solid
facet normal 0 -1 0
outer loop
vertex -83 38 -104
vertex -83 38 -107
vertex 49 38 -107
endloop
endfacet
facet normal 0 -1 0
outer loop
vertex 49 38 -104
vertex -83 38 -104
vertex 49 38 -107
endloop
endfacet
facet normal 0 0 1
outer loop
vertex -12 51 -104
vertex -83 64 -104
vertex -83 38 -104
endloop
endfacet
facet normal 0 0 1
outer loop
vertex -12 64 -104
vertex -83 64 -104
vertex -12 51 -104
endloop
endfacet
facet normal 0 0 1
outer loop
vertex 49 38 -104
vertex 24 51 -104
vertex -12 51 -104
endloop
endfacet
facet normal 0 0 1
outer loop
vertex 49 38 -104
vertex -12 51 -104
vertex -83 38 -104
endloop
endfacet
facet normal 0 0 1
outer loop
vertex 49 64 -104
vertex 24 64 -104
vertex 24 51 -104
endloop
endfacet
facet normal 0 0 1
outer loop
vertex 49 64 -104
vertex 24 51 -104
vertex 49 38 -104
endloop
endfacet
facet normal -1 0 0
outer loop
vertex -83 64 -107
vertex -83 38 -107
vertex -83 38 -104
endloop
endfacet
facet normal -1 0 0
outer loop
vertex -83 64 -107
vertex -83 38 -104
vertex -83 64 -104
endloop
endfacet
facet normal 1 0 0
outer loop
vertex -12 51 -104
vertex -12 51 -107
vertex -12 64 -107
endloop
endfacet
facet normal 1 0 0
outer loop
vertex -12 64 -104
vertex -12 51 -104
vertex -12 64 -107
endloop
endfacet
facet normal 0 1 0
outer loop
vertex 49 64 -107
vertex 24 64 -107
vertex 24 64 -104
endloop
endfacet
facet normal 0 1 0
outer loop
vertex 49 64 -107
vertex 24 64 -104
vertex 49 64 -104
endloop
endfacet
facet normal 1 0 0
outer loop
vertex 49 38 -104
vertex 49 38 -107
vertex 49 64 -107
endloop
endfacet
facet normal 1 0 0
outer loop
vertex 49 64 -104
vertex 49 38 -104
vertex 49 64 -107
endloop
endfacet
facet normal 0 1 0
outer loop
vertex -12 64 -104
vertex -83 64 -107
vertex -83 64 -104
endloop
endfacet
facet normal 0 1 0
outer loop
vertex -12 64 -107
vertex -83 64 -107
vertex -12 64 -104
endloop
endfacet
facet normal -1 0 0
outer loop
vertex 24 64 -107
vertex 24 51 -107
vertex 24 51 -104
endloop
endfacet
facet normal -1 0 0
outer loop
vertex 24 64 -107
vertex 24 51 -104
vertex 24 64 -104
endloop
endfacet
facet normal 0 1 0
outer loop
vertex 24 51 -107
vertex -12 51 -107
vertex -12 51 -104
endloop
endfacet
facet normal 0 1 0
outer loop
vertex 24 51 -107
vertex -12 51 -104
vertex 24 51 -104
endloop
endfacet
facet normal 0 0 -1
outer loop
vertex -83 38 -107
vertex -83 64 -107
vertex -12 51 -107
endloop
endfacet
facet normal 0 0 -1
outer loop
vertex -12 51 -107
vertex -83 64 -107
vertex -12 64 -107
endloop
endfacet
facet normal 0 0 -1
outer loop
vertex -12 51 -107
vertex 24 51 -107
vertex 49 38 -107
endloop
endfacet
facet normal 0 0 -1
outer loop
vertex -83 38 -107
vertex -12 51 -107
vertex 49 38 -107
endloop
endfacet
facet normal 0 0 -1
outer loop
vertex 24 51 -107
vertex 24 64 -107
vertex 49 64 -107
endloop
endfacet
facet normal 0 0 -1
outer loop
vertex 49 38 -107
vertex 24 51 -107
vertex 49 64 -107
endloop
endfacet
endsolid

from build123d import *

# Parameters (mm, degrees)
BOX004_W     = 36
BOX004_H     = 13
BOX004_DEPTH = 3
BOX005_W     = 25
BOX005_H     = 26
BOX005_DEPTH = 3
BOX003_W     = 71
BOX003_H     = 26
BOX003_DEPTH = 3


with BuildPart() as cube004:
    # Box004 → Box004 (new body)
    with BuildSketch(Plane(origin=(-12, 38, -107), x_dir=(1, 0, 0), z_dir=(0, 0, 1))):
        with Locations((18, 6.5)):
            Rectangle(BOX004_W, BOX004_H)
    extrude(amount=BOX004_DEPTH)


with BuildPart() as cube005:
    # Box005 → Box005 (new body)
    with BuildSketch(Plane(origin=(24, 38, -107), x_dir=(1, 0, 0), z_dir=(0, 0, 1))):
        with Locations((12.5, 13)):
            Rectangle(BOX005_W, BOX005_H)
    extrude(amount=BOX005_DEPTH)


with BuildPart() as fusion:
    # Box003 → Box003 (new body)
    with BuildSketch(Plane(origin=(-83, 38, -107), x_dir=(1, 0, 0), z_dir=(0, 0, 1))):
        with Locations((35.5, 13)):
            Rectangle(BOX003_W, BOX003_H)
    extrude(amount=BOX003_DEPTH)

    # Fusion: union Cube004, Cube005
    add(cube004.part)
    add(cube005.part)


solid = fusion.part
